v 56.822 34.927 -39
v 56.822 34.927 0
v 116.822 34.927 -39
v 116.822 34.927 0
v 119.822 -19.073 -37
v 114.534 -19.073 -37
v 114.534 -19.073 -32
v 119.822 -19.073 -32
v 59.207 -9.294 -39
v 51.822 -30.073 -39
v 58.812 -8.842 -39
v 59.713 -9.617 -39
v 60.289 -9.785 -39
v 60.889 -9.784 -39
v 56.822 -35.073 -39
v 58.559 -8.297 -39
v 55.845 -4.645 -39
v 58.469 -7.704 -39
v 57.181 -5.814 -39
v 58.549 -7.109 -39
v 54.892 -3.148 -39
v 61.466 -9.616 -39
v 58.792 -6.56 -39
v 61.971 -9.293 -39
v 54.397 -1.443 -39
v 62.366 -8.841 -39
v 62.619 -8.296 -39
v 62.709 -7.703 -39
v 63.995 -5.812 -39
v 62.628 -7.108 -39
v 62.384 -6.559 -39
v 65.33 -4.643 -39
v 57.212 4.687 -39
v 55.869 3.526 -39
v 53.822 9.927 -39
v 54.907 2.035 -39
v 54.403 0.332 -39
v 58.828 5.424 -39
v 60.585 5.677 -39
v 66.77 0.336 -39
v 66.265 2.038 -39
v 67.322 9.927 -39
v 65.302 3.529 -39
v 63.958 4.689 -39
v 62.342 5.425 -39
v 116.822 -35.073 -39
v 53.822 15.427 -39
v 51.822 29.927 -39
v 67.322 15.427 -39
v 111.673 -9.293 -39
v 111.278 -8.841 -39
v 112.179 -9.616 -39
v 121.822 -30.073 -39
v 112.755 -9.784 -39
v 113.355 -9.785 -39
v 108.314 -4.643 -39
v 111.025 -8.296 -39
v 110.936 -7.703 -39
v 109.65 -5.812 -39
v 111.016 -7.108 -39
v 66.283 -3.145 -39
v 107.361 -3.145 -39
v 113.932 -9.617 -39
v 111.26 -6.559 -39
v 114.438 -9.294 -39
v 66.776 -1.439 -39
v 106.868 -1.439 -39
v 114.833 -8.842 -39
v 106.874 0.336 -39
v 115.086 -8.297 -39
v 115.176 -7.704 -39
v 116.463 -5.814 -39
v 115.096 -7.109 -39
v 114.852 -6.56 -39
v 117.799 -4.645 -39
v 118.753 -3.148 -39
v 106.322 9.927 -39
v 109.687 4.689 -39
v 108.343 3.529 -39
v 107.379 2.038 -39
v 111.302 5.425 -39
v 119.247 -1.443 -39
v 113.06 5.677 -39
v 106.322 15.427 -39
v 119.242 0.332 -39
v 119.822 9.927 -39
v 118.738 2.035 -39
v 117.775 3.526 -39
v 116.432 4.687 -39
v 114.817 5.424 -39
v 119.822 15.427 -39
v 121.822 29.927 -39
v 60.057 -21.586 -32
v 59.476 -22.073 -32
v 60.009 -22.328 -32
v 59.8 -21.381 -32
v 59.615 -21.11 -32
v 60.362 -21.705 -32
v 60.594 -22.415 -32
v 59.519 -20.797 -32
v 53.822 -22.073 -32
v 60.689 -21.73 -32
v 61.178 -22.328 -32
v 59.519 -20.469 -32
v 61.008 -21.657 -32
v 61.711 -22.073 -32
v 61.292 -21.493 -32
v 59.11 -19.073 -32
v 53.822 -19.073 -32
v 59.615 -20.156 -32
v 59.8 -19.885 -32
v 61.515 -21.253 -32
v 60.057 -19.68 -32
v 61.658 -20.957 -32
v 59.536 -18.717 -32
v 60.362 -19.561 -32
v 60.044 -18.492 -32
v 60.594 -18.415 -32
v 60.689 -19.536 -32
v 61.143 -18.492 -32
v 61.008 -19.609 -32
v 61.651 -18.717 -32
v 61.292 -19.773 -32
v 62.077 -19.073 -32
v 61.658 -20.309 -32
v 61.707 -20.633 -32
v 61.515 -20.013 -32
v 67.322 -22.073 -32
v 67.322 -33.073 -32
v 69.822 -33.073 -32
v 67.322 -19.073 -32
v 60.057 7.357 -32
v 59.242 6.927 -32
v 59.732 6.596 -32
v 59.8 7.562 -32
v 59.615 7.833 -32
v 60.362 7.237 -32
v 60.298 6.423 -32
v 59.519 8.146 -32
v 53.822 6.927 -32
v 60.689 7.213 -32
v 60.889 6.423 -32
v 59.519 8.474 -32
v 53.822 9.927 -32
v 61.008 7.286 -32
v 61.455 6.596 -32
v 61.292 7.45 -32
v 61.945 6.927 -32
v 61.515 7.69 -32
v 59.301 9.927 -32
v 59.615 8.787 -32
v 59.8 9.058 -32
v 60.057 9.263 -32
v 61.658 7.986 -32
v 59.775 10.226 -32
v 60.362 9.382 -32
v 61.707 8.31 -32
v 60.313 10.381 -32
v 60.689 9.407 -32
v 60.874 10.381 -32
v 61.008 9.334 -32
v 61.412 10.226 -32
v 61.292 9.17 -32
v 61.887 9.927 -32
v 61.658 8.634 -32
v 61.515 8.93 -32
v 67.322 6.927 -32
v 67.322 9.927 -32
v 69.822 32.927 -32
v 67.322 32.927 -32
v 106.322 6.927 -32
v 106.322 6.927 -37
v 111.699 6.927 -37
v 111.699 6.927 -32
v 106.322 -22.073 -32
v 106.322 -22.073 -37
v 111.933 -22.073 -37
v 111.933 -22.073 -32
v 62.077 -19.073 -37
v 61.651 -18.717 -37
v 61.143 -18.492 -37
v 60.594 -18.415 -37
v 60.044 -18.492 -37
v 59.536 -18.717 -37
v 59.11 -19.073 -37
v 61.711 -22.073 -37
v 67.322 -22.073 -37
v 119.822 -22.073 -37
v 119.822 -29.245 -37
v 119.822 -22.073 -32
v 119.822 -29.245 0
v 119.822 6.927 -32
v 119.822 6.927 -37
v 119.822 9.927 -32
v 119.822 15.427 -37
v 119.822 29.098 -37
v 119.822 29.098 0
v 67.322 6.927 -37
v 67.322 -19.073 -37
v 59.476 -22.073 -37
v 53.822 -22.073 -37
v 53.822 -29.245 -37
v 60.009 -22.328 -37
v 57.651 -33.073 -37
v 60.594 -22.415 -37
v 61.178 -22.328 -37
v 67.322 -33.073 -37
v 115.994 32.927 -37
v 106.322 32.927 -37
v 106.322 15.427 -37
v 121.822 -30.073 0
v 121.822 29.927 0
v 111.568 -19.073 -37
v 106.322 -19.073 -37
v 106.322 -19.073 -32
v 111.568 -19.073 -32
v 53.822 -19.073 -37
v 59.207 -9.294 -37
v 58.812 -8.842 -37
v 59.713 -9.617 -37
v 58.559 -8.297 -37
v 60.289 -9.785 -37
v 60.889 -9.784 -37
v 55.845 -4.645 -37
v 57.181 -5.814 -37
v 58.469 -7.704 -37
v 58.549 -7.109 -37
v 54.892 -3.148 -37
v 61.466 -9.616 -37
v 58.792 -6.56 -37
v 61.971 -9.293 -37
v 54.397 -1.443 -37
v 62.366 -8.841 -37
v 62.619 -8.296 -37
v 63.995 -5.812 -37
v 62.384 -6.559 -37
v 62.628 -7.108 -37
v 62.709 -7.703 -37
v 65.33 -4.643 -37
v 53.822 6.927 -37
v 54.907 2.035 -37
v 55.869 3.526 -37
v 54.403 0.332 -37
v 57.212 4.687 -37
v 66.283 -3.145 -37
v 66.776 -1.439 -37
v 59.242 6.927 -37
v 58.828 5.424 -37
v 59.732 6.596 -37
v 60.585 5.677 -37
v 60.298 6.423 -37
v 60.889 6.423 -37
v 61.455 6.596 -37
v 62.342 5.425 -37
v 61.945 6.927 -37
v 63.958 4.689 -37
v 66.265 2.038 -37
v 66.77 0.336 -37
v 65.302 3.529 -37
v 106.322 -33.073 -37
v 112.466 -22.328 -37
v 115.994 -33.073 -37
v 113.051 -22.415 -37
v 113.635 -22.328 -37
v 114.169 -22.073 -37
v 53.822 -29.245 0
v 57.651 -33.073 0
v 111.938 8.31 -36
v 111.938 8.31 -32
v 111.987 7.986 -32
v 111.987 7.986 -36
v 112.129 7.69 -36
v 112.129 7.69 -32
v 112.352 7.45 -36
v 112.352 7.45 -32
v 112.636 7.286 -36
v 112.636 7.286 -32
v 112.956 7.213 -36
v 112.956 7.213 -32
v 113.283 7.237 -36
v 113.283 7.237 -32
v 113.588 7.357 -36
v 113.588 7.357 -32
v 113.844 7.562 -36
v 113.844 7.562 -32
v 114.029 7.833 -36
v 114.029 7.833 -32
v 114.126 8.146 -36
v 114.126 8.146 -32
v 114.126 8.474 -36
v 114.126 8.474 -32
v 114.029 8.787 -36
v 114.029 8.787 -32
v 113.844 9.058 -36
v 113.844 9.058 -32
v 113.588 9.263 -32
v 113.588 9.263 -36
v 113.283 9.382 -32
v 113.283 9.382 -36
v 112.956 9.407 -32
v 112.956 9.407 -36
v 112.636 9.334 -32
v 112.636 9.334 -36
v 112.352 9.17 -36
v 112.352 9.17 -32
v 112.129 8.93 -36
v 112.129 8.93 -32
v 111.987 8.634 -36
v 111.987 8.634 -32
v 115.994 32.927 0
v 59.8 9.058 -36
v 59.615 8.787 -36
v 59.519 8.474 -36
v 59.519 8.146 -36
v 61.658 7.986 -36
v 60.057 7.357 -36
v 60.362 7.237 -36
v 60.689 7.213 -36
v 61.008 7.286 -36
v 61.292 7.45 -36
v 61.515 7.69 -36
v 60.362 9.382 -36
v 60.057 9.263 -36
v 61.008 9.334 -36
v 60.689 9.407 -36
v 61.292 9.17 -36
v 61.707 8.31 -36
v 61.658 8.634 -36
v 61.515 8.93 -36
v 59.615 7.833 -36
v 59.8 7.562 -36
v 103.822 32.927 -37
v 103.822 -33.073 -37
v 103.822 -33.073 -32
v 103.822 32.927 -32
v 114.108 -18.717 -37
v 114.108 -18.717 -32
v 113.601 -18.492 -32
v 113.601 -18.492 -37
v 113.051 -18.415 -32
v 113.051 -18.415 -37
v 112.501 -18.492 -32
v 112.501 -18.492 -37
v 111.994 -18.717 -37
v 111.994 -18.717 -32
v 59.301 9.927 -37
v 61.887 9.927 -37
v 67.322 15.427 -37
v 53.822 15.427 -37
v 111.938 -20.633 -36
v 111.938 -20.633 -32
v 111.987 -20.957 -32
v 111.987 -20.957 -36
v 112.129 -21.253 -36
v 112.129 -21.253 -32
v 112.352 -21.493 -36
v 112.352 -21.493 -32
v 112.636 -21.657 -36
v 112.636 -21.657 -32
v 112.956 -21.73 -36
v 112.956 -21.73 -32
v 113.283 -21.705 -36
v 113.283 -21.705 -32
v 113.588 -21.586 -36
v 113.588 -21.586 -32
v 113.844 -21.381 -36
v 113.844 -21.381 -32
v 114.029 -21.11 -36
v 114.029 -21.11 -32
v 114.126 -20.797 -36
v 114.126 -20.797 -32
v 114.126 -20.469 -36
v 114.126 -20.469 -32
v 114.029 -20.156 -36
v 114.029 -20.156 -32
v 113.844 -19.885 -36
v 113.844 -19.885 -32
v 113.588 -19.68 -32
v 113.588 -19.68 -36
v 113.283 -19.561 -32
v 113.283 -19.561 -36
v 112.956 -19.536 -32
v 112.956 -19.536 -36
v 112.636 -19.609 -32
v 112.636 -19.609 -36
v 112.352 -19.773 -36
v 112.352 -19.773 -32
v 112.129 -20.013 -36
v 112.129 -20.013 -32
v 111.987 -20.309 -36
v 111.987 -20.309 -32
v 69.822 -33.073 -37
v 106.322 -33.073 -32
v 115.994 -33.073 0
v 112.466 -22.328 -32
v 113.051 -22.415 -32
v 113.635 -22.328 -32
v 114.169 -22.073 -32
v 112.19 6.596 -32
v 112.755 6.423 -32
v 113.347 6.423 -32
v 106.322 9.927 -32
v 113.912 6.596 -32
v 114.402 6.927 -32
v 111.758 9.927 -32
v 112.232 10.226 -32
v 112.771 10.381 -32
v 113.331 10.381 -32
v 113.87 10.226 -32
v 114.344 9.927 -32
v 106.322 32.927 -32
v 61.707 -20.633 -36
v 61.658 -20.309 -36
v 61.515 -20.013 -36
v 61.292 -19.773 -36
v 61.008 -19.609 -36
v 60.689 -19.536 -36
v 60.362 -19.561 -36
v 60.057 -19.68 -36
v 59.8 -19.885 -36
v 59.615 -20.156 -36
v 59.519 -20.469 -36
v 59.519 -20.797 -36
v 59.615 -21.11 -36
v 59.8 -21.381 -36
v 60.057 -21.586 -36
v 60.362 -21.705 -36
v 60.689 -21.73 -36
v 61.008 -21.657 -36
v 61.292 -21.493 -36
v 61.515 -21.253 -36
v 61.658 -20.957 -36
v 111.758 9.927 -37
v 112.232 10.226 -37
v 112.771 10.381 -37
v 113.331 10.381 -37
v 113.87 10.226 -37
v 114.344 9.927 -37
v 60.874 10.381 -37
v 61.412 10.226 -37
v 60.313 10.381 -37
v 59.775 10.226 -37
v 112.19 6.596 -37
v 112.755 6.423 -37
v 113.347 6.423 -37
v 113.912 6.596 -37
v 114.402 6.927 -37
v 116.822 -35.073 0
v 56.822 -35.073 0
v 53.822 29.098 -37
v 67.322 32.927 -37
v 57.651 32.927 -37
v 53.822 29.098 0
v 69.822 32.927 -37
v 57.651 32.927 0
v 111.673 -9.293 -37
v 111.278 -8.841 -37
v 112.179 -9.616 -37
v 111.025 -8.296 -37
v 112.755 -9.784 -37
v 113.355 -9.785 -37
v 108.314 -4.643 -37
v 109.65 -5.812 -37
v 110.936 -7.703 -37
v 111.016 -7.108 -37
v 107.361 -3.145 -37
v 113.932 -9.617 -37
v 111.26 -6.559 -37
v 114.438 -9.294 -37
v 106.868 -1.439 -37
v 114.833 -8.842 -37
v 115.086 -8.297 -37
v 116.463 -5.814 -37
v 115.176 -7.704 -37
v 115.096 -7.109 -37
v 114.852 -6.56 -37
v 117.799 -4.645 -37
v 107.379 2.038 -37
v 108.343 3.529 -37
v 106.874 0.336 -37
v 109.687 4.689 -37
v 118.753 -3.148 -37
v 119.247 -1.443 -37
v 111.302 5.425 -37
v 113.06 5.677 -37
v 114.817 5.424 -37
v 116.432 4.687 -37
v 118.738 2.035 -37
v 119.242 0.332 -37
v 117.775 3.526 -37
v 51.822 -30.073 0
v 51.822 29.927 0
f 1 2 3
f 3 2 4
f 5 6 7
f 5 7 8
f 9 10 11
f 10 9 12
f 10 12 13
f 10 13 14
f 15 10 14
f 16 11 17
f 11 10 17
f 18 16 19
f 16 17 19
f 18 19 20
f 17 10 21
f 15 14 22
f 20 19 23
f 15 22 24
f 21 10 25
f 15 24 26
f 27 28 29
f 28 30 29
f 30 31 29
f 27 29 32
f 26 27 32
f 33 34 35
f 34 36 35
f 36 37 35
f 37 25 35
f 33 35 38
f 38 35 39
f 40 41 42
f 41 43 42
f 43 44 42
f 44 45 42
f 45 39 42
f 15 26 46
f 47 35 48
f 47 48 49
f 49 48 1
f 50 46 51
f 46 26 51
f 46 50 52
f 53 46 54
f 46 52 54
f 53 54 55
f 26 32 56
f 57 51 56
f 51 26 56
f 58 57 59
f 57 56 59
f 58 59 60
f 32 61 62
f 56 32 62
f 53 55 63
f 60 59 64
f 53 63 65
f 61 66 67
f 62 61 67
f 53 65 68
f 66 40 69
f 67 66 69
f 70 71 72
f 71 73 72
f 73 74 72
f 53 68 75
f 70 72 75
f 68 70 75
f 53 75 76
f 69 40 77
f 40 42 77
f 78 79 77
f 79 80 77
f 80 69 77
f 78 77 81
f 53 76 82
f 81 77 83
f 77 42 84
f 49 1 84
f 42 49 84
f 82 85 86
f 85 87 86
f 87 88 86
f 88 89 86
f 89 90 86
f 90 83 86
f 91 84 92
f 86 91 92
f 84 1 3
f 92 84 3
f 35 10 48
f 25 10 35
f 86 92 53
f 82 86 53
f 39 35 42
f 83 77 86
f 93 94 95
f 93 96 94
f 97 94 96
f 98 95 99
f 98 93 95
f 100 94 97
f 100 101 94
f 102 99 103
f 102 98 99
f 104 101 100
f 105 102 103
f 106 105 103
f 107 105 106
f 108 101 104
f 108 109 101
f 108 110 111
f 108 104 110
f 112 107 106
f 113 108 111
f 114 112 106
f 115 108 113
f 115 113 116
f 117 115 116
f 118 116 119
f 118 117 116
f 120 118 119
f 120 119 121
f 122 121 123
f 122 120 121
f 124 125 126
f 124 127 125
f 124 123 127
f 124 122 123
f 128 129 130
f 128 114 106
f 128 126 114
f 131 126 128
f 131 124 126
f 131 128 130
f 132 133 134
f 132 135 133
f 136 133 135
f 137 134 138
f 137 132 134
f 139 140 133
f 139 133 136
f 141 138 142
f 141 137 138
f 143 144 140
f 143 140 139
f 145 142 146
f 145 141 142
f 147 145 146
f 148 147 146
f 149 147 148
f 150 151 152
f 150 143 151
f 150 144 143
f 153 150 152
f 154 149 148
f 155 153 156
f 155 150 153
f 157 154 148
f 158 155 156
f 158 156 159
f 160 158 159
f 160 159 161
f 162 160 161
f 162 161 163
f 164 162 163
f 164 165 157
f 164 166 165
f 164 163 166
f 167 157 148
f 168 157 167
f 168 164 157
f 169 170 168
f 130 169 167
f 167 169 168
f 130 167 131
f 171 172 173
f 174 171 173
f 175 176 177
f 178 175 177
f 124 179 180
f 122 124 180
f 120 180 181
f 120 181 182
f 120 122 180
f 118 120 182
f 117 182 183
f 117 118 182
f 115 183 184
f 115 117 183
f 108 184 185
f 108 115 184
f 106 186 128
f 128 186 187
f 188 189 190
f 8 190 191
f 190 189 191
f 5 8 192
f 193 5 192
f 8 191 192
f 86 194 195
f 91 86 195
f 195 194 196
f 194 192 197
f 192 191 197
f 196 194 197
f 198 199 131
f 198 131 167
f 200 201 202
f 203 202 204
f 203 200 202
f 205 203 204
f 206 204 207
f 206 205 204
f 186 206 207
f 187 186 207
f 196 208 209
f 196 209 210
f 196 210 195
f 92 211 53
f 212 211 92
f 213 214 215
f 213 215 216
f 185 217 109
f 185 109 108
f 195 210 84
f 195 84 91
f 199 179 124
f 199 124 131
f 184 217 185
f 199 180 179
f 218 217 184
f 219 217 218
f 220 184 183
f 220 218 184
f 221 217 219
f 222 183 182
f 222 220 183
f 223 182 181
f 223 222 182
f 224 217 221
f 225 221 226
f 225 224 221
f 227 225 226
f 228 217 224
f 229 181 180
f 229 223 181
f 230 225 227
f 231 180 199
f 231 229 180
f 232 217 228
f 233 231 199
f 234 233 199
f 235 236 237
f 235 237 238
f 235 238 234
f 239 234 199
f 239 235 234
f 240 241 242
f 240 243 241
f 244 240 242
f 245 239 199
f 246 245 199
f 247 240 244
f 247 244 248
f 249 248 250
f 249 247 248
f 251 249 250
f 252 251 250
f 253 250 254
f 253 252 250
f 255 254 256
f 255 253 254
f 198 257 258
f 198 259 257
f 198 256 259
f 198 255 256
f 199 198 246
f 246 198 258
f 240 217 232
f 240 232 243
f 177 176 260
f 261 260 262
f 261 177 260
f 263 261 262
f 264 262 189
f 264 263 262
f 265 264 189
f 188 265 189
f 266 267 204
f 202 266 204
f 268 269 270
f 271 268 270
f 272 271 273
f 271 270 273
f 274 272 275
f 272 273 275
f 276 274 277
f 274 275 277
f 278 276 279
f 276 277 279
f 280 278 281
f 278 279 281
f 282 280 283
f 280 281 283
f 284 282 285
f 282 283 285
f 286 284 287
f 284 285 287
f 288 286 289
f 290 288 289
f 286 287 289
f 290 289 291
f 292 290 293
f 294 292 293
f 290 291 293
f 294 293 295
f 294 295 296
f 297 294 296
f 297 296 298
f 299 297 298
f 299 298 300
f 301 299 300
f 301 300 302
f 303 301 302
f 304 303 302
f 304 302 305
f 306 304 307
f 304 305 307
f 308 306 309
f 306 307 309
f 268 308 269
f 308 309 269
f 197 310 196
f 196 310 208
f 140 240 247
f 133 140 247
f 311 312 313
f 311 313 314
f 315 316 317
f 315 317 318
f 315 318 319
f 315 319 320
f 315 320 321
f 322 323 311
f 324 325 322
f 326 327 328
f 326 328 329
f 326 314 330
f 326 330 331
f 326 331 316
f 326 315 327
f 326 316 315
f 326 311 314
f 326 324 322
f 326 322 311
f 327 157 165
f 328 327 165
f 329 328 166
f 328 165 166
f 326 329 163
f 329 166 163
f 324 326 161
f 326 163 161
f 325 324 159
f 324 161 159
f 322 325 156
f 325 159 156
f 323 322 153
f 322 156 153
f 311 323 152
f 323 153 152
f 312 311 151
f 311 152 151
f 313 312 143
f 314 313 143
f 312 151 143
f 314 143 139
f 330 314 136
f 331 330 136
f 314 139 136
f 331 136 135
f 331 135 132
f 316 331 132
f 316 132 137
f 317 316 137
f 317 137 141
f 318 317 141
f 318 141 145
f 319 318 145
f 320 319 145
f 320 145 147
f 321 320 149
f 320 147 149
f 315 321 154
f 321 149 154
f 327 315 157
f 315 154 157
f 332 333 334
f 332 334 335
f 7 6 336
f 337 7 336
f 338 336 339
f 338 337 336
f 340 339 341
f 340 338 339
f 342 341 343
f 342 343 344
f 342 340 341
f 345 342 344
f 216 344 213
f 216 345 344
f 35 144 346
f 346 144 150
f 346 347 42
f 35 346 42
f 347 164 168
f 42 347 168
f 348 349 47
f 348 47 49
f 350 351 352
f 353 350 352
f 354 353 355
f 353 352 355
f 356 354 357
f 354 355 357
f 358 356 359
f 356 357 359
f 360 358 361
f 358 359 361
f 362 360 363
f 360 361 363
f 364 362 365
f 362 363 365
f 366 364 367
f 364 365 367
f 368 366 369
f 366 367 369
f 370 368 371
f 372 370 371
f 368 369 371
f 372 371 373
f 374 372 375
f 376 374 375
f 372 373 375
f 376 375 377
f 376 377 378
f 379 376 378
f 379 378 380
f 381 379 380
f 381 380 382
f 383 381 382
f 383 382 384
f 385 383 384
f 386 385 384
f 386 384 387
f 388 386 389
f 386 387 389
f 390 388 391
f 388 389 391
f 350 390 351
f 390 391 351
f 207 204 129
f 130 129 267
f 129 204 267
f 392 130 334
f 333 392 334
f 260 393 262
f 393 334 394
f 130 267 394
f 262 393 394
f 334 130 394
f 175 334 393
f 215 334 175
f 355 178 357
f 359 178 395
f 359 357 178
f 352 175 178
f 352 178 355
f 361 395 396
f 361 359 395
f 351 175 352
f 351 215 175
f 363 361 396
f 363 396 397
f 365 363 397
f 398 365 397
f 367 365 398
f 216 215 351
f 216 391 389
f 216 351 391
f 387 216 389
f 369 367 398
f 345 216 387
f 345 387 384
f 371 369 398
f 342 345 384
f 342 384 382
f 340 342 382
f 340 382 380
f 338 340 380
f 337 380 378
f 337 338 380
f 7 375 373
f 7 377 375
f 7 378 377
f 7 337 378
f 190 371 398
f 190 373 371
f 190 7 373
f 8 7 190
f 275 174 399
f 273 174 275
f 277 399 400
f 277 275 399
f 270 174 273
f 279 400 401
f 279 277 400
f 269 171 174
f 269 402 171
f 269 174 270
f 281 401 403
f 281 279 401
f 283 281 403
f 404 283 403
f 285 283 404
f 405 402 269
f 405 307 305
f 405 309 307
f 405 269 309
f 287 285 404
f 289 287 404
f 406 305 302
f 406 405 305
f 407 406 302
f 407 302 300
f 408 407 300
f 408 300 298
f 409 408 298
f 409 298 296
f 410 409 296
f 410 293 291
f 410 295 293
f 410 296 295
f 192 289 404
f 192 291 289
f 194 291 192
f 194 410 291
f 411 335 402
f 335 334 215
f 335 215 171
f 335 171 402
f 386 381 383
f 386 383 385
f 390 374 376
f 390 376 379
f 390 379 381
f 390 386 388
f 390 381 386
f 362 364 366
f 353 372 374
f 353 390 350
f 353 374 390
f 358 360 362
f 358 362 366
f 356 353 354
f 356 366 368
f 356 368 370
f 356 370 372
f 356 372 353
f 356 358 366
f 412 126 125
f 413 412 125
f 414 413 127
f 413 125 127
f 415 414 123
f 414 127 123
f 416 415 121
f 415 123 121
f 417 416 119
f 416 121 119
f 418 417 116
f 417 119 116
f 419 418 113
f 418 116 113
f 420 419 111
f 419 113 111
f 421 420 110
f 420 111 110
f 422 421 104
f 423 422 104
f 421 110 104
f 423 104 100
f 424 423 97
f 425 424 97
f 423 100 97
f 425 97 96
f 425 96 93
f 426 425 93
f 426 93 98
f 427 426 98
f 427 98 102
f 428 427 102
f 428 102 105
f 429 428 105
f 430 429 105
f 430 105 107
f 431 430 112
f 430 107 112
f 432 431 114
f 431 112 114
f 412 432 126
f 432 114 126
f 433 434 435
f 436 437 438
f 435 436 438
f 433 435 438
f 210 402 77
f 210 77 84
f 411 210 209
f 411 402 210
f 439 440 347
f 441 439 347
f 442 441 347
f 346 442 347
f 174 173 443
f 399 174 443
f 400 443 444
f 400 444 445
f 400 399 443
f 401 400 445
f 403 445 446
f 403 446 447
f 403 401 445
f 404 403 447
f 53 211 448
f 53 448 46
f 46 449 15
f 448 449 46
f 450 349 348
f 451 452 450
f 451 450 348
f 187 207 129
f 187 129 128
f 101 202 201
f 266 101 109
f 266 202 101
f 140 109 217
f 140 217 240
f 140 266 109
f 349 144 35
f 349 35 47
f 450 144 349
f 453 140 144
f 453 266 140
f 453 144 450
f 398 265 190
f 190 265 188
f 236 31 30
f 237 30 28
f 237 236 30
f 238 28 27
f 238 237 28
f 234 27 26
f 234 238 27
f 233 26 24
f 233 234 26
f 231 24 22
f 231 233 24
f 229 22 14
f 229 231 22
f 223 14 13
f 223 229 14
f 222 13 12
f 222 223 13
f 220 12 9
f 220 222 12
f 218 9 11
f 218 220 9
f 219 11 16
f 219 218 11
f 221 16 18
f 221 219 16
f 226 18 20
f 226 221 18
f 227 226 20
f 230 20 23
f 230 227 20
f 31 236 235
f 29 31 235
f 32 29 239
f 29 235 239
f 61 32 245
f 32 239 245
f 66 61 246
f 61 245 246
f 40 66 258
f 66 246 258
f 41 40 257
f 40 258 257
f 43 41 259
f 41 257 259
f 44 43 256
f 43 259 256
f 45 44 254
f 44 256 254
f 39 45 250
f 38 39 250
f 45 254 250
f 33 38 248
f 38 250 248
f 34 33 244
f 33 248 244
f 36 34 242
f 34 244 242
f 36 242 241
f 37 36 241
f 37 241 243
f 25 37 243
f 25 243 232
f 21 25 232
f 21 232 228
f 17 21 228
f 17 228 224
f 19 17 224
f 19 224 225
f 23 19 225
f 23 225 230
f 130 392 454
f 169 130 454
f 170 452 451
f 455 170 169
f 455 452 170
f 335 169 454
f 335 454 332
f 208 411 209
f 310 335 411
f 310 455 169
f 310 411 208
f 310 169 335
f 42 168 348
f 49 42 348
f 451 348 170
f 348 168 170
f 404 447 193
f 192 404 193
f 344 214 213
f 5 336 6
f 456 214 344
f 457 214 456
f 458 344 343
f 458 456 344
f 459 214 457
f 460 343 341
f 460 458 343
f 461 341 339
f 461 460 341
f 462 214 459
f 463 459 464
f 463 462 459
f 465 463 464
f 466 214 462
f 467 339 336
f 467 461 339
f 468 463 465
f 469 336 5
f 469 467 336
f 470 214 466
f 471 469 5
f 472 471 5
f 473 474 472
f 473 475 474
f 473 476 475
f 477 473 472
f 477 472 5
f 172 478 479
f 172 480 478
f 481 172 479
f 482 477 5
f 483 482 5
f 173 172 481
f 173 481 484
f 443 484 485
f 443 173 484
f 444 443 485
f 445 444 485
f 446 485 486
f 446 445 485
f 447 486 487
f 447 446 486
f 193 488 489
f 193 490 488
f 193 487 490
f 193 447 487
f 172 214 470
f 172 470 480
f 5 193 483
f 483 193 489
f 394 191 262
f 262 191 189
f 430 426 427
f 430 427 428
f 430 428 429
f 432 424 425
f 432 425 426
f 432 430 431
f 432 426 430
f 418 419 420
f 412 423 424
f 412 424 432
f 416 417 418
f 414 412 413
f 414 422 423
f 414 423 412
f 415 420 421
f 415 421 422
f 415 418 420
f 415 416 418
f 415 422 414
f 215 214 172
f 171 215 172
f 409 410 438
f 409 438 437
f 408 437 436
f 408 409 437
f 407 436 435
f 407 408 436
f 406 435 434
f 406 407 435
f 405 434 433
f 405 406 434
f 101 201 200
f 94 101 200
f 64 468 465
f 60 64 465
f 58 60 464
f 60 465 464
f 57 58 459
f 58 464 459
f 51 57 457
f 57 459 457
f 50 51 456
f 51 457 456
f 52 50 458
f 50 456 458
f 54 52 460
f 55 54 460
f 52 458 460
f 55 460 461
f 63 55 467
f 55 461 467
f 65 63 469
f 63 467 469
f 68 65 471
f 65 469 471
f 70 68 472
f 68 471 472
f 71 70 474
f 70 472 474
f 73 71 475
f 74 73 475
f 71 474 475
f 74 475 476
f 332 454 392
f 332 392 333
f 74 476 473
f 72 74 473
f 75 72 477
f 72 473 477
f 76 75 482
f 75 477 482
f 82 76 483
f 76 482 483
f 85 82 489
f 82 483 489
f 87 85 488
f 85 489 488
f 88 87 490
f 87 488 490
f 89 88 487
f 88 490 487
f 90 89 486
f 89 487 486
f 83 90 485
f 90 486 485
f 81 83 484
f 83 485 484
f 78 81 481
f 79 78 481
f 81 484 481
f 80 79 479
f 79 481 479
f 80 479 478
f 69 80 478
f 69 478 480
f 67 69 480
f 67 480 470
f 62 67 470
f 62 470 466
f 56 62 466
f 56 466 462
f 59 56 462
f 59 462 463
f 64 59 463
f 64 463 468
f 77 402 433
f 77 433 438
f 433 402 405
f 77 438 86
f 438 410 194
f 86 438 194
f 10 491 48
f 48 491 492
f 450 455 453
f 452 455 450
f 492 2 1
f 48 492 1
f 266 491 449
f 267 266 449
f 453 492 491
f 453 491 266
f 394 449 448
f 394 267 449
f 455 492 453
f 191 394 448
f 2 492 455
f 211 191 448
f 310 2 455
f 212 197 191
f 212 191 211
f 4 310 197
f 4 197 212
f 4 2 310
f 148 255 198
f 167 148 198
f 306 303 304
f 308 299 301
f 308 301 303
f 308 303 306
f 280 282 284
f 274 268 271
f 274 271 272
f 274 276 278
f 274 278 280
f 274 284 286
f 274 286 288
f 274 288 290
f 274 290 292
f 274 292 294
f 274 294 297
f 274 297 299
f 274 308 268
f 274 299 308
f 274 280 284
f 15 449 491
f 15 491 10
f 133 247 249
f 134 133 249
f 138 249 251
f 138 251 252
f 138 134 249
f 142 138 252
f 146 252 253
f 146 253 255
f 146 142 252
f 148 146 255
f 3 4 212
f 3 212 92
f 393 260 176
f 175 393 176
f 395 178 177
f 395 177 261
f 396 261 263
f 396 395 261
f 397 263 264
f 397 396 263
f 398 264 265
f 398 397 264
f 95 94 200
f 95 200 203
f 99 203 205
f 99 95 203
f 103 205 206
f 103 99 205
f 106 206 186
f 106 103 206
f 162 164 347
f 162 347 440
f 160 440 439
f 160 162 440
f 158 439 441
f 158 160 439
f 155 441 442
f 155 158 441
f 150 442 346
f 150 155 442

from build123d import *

# Parameters (mm, degrees)
SKETCH1_W           = 70
SKETCH1_H           = 70
BOSS_EXTRUDE1_DEPTH = 39
CHAMFER1_SIZE       = 5
SHELL1_T            = -2
SKETCH3_W           = 2.5
SKETCH3_H           = 66
BOSS_EXTRUDE2_DEPTH = 5
SKETCH4_W           = 13.5
SKETCH4_H           = 3
BOSS_EXTRUDE3_DEPTH = 5
SKETCH5_W           = 13.5
SKETCH5_H           = 5.5
CUT_EXTRUDE1_DEPTH  = 133.059792404
SKETCH6_R           = 6.25
CUT_EXTRUDE2_DEPTH  = 133.059792404
CUT_EXTRUDE3_DEPTH  = 10
SKETCH9_R           = 2
BOSS_EXTRUDE4_DEPTH = 5
SKETCH10_R          = 1.1
CUT_EXTRUDE4_DEPTH  = 4


with BuildPart() as part:
    # Sketch1 → Boss-Extrude1 (new body)
    with BuildSketch(Plane.XY):
        with Locations((86.822194683, -0.073375262)):
            Rectangle(SKETCH1_W, SKETCH1_H)
    extrude(amount=-BOSS_EXTRUDE1_DEPTH)

    # Chamfer1
    chamfer1_edges = [part.edges().sort_by_distance(p)[0] for p in [
        (51.822194683, 34.926624738, -19.5),
        (121.822194683, 34.926624738, -19.5),
        (121.822194683, -35.073375262, -19.5),
        (51.822194683, -35.073375262, -19.5),
    ]]
    chamfer(chamfer1_edges, length=CHAMFER1_SIZE)

    # Shell1
    shell1_openings = [part.faces().sort_by_distance(p)[0] for p in [
        (86.822194683, -0.073375262, 0),
    ]]
    offset(amount=SHELL1_T, openings=shell1_openings, kind=Kind.INTERSECTION)

    # Sketch3 → Boss-Extrude2 (add)
    with BuildSketch(Plane.XY.offset(-37)):
        with Locations((68.572194683, -0.073375262)):
            Rectangle(SKETCH3_W, SKETCH3_H)
        with Locations((105.072194683, -0.073375262)):
            Rectangle(SKETCH3_W, SKETCH3_H)
    extrude(amount=BOSS_EXTRUDE2_DEPTH)

    # Sketch4 → Boss-Extrude3 (add)
    with BuildSketch(Plane.XY.offset(-37)):
        with Locations((60.572194683, -20.573375262)):
            Rectangle(SKETCH4_W, SKETCH4_H)
        with Locations((60.572194683, 8.426624738)):
            Rectangle(SKETCH4_W, SKETCH4_H)
        with Locations((113.072194683, -20.573375262)):
            Rectangle(SKETCH4_W, SKETCH4_H)
        with Locations((113.072194683, 8.426624738)):
            Rectangle(SKETCH4_W, SKETCH4_H)
    extrude(amount=BOSS_EXTRUDE3_DEPTH)

    # Sketch5 → Cut-Extrude1 (cut, through all)
    with BuildSketch(Plane.XY.offset(-37)):
        with Locations((60.572194683, 12.676624738)):
            Rectangle(SKETCH5_W, SKETCH5_H)
        with Locations((113.072194683, 12.676624738)):
            Rectangle(SKETCH5_W, SKETCH5_H)
    extrude(amount=-CUT_EXTRUDE1_DEPTH, mode=Mode.SUBTRACT)

    # Sketch6 → Cut-Extrude2 (cut, through all)
    with BuildSketch(Plane.XY.offset(-37)):
        with Locations((60.586585442, -0.573375262)):
            Circle(SKETCH6_R)
        with Locations(Location((113.057803924, -0.573375262, 0), (0, 0, 180))):
            Circle(SKETCH6_R)
    extrude(amount=-CUT_EXTRUDE2_DEPTH, mode=Mode.SUBTRACT)

    # Sketch8 → Cut-Extrude3 (cut)
    with BuildSketch(Plane.XY.offset(-37)):
        with BuildLine():
            Line((58.792309456, -6.560283787), (62.384377825, -6.559228798))
            ThreePointArc((62.384377825, -6.559228798), (60.589297041, -9.805930725), (58.792309456, -6.560283787))
        make_face()
        with BuildLine():
            Line((114.85207991, -6.560283787), (111.260011542, -6.559228798))
            ThreePointArc((111.260011542, -6.559228798), (113.055092325, -9.805930725), (114.85207991, -6.560283787))
        make_face()
    extrude(amount=-CUT_EXTRUDE3_DEPTH, mode=Mode.SUBTRACT)

    # Sketch9 → Boss-Extrude4 (add)
    with BuildSketch(Plane.XY.offset(-32)):
        with Locations((60.59354187, 8.400826661)):
            Circle(SKETCH9_R)
        with Locations((60.59354187, -20.414986166)):
            Circle(SKETCH9_R)
        with Locations((113.050847497, -20.414986166)):
            Circle(SKETCH9_R)
        with Locations((113.050847497, 8.400826661)):
            Circle(SKETCH9_R)
    extrude(amount=-BOSS_EXTRUDE4_DEPTH)

    # Sketch10 → Cut-Extrude4 (cut)
    with BuildSketch(Plane.XY.offset(-32)):
        with Locations((60.60651545, 8.30988812)):
            Circle(SKETCH10_R)
        with Locations((60.60651545, -20.632962205)):
            Circle(SKETCH10_R)
        with Locations(Location((113.037873916, -20.632962205, 0), (0, 0, 180))):
            Circle(SKETCH10_R)
        with Locations(Location((113.037873916, 8.30988812, 0), (0, 0, 180))):
            Circle(SKETCH10_R)
    extrude(amount=-CUT_EXTRUDE4_DEPTH, mode=Mode.SUBTRACT)


solid = part.part
